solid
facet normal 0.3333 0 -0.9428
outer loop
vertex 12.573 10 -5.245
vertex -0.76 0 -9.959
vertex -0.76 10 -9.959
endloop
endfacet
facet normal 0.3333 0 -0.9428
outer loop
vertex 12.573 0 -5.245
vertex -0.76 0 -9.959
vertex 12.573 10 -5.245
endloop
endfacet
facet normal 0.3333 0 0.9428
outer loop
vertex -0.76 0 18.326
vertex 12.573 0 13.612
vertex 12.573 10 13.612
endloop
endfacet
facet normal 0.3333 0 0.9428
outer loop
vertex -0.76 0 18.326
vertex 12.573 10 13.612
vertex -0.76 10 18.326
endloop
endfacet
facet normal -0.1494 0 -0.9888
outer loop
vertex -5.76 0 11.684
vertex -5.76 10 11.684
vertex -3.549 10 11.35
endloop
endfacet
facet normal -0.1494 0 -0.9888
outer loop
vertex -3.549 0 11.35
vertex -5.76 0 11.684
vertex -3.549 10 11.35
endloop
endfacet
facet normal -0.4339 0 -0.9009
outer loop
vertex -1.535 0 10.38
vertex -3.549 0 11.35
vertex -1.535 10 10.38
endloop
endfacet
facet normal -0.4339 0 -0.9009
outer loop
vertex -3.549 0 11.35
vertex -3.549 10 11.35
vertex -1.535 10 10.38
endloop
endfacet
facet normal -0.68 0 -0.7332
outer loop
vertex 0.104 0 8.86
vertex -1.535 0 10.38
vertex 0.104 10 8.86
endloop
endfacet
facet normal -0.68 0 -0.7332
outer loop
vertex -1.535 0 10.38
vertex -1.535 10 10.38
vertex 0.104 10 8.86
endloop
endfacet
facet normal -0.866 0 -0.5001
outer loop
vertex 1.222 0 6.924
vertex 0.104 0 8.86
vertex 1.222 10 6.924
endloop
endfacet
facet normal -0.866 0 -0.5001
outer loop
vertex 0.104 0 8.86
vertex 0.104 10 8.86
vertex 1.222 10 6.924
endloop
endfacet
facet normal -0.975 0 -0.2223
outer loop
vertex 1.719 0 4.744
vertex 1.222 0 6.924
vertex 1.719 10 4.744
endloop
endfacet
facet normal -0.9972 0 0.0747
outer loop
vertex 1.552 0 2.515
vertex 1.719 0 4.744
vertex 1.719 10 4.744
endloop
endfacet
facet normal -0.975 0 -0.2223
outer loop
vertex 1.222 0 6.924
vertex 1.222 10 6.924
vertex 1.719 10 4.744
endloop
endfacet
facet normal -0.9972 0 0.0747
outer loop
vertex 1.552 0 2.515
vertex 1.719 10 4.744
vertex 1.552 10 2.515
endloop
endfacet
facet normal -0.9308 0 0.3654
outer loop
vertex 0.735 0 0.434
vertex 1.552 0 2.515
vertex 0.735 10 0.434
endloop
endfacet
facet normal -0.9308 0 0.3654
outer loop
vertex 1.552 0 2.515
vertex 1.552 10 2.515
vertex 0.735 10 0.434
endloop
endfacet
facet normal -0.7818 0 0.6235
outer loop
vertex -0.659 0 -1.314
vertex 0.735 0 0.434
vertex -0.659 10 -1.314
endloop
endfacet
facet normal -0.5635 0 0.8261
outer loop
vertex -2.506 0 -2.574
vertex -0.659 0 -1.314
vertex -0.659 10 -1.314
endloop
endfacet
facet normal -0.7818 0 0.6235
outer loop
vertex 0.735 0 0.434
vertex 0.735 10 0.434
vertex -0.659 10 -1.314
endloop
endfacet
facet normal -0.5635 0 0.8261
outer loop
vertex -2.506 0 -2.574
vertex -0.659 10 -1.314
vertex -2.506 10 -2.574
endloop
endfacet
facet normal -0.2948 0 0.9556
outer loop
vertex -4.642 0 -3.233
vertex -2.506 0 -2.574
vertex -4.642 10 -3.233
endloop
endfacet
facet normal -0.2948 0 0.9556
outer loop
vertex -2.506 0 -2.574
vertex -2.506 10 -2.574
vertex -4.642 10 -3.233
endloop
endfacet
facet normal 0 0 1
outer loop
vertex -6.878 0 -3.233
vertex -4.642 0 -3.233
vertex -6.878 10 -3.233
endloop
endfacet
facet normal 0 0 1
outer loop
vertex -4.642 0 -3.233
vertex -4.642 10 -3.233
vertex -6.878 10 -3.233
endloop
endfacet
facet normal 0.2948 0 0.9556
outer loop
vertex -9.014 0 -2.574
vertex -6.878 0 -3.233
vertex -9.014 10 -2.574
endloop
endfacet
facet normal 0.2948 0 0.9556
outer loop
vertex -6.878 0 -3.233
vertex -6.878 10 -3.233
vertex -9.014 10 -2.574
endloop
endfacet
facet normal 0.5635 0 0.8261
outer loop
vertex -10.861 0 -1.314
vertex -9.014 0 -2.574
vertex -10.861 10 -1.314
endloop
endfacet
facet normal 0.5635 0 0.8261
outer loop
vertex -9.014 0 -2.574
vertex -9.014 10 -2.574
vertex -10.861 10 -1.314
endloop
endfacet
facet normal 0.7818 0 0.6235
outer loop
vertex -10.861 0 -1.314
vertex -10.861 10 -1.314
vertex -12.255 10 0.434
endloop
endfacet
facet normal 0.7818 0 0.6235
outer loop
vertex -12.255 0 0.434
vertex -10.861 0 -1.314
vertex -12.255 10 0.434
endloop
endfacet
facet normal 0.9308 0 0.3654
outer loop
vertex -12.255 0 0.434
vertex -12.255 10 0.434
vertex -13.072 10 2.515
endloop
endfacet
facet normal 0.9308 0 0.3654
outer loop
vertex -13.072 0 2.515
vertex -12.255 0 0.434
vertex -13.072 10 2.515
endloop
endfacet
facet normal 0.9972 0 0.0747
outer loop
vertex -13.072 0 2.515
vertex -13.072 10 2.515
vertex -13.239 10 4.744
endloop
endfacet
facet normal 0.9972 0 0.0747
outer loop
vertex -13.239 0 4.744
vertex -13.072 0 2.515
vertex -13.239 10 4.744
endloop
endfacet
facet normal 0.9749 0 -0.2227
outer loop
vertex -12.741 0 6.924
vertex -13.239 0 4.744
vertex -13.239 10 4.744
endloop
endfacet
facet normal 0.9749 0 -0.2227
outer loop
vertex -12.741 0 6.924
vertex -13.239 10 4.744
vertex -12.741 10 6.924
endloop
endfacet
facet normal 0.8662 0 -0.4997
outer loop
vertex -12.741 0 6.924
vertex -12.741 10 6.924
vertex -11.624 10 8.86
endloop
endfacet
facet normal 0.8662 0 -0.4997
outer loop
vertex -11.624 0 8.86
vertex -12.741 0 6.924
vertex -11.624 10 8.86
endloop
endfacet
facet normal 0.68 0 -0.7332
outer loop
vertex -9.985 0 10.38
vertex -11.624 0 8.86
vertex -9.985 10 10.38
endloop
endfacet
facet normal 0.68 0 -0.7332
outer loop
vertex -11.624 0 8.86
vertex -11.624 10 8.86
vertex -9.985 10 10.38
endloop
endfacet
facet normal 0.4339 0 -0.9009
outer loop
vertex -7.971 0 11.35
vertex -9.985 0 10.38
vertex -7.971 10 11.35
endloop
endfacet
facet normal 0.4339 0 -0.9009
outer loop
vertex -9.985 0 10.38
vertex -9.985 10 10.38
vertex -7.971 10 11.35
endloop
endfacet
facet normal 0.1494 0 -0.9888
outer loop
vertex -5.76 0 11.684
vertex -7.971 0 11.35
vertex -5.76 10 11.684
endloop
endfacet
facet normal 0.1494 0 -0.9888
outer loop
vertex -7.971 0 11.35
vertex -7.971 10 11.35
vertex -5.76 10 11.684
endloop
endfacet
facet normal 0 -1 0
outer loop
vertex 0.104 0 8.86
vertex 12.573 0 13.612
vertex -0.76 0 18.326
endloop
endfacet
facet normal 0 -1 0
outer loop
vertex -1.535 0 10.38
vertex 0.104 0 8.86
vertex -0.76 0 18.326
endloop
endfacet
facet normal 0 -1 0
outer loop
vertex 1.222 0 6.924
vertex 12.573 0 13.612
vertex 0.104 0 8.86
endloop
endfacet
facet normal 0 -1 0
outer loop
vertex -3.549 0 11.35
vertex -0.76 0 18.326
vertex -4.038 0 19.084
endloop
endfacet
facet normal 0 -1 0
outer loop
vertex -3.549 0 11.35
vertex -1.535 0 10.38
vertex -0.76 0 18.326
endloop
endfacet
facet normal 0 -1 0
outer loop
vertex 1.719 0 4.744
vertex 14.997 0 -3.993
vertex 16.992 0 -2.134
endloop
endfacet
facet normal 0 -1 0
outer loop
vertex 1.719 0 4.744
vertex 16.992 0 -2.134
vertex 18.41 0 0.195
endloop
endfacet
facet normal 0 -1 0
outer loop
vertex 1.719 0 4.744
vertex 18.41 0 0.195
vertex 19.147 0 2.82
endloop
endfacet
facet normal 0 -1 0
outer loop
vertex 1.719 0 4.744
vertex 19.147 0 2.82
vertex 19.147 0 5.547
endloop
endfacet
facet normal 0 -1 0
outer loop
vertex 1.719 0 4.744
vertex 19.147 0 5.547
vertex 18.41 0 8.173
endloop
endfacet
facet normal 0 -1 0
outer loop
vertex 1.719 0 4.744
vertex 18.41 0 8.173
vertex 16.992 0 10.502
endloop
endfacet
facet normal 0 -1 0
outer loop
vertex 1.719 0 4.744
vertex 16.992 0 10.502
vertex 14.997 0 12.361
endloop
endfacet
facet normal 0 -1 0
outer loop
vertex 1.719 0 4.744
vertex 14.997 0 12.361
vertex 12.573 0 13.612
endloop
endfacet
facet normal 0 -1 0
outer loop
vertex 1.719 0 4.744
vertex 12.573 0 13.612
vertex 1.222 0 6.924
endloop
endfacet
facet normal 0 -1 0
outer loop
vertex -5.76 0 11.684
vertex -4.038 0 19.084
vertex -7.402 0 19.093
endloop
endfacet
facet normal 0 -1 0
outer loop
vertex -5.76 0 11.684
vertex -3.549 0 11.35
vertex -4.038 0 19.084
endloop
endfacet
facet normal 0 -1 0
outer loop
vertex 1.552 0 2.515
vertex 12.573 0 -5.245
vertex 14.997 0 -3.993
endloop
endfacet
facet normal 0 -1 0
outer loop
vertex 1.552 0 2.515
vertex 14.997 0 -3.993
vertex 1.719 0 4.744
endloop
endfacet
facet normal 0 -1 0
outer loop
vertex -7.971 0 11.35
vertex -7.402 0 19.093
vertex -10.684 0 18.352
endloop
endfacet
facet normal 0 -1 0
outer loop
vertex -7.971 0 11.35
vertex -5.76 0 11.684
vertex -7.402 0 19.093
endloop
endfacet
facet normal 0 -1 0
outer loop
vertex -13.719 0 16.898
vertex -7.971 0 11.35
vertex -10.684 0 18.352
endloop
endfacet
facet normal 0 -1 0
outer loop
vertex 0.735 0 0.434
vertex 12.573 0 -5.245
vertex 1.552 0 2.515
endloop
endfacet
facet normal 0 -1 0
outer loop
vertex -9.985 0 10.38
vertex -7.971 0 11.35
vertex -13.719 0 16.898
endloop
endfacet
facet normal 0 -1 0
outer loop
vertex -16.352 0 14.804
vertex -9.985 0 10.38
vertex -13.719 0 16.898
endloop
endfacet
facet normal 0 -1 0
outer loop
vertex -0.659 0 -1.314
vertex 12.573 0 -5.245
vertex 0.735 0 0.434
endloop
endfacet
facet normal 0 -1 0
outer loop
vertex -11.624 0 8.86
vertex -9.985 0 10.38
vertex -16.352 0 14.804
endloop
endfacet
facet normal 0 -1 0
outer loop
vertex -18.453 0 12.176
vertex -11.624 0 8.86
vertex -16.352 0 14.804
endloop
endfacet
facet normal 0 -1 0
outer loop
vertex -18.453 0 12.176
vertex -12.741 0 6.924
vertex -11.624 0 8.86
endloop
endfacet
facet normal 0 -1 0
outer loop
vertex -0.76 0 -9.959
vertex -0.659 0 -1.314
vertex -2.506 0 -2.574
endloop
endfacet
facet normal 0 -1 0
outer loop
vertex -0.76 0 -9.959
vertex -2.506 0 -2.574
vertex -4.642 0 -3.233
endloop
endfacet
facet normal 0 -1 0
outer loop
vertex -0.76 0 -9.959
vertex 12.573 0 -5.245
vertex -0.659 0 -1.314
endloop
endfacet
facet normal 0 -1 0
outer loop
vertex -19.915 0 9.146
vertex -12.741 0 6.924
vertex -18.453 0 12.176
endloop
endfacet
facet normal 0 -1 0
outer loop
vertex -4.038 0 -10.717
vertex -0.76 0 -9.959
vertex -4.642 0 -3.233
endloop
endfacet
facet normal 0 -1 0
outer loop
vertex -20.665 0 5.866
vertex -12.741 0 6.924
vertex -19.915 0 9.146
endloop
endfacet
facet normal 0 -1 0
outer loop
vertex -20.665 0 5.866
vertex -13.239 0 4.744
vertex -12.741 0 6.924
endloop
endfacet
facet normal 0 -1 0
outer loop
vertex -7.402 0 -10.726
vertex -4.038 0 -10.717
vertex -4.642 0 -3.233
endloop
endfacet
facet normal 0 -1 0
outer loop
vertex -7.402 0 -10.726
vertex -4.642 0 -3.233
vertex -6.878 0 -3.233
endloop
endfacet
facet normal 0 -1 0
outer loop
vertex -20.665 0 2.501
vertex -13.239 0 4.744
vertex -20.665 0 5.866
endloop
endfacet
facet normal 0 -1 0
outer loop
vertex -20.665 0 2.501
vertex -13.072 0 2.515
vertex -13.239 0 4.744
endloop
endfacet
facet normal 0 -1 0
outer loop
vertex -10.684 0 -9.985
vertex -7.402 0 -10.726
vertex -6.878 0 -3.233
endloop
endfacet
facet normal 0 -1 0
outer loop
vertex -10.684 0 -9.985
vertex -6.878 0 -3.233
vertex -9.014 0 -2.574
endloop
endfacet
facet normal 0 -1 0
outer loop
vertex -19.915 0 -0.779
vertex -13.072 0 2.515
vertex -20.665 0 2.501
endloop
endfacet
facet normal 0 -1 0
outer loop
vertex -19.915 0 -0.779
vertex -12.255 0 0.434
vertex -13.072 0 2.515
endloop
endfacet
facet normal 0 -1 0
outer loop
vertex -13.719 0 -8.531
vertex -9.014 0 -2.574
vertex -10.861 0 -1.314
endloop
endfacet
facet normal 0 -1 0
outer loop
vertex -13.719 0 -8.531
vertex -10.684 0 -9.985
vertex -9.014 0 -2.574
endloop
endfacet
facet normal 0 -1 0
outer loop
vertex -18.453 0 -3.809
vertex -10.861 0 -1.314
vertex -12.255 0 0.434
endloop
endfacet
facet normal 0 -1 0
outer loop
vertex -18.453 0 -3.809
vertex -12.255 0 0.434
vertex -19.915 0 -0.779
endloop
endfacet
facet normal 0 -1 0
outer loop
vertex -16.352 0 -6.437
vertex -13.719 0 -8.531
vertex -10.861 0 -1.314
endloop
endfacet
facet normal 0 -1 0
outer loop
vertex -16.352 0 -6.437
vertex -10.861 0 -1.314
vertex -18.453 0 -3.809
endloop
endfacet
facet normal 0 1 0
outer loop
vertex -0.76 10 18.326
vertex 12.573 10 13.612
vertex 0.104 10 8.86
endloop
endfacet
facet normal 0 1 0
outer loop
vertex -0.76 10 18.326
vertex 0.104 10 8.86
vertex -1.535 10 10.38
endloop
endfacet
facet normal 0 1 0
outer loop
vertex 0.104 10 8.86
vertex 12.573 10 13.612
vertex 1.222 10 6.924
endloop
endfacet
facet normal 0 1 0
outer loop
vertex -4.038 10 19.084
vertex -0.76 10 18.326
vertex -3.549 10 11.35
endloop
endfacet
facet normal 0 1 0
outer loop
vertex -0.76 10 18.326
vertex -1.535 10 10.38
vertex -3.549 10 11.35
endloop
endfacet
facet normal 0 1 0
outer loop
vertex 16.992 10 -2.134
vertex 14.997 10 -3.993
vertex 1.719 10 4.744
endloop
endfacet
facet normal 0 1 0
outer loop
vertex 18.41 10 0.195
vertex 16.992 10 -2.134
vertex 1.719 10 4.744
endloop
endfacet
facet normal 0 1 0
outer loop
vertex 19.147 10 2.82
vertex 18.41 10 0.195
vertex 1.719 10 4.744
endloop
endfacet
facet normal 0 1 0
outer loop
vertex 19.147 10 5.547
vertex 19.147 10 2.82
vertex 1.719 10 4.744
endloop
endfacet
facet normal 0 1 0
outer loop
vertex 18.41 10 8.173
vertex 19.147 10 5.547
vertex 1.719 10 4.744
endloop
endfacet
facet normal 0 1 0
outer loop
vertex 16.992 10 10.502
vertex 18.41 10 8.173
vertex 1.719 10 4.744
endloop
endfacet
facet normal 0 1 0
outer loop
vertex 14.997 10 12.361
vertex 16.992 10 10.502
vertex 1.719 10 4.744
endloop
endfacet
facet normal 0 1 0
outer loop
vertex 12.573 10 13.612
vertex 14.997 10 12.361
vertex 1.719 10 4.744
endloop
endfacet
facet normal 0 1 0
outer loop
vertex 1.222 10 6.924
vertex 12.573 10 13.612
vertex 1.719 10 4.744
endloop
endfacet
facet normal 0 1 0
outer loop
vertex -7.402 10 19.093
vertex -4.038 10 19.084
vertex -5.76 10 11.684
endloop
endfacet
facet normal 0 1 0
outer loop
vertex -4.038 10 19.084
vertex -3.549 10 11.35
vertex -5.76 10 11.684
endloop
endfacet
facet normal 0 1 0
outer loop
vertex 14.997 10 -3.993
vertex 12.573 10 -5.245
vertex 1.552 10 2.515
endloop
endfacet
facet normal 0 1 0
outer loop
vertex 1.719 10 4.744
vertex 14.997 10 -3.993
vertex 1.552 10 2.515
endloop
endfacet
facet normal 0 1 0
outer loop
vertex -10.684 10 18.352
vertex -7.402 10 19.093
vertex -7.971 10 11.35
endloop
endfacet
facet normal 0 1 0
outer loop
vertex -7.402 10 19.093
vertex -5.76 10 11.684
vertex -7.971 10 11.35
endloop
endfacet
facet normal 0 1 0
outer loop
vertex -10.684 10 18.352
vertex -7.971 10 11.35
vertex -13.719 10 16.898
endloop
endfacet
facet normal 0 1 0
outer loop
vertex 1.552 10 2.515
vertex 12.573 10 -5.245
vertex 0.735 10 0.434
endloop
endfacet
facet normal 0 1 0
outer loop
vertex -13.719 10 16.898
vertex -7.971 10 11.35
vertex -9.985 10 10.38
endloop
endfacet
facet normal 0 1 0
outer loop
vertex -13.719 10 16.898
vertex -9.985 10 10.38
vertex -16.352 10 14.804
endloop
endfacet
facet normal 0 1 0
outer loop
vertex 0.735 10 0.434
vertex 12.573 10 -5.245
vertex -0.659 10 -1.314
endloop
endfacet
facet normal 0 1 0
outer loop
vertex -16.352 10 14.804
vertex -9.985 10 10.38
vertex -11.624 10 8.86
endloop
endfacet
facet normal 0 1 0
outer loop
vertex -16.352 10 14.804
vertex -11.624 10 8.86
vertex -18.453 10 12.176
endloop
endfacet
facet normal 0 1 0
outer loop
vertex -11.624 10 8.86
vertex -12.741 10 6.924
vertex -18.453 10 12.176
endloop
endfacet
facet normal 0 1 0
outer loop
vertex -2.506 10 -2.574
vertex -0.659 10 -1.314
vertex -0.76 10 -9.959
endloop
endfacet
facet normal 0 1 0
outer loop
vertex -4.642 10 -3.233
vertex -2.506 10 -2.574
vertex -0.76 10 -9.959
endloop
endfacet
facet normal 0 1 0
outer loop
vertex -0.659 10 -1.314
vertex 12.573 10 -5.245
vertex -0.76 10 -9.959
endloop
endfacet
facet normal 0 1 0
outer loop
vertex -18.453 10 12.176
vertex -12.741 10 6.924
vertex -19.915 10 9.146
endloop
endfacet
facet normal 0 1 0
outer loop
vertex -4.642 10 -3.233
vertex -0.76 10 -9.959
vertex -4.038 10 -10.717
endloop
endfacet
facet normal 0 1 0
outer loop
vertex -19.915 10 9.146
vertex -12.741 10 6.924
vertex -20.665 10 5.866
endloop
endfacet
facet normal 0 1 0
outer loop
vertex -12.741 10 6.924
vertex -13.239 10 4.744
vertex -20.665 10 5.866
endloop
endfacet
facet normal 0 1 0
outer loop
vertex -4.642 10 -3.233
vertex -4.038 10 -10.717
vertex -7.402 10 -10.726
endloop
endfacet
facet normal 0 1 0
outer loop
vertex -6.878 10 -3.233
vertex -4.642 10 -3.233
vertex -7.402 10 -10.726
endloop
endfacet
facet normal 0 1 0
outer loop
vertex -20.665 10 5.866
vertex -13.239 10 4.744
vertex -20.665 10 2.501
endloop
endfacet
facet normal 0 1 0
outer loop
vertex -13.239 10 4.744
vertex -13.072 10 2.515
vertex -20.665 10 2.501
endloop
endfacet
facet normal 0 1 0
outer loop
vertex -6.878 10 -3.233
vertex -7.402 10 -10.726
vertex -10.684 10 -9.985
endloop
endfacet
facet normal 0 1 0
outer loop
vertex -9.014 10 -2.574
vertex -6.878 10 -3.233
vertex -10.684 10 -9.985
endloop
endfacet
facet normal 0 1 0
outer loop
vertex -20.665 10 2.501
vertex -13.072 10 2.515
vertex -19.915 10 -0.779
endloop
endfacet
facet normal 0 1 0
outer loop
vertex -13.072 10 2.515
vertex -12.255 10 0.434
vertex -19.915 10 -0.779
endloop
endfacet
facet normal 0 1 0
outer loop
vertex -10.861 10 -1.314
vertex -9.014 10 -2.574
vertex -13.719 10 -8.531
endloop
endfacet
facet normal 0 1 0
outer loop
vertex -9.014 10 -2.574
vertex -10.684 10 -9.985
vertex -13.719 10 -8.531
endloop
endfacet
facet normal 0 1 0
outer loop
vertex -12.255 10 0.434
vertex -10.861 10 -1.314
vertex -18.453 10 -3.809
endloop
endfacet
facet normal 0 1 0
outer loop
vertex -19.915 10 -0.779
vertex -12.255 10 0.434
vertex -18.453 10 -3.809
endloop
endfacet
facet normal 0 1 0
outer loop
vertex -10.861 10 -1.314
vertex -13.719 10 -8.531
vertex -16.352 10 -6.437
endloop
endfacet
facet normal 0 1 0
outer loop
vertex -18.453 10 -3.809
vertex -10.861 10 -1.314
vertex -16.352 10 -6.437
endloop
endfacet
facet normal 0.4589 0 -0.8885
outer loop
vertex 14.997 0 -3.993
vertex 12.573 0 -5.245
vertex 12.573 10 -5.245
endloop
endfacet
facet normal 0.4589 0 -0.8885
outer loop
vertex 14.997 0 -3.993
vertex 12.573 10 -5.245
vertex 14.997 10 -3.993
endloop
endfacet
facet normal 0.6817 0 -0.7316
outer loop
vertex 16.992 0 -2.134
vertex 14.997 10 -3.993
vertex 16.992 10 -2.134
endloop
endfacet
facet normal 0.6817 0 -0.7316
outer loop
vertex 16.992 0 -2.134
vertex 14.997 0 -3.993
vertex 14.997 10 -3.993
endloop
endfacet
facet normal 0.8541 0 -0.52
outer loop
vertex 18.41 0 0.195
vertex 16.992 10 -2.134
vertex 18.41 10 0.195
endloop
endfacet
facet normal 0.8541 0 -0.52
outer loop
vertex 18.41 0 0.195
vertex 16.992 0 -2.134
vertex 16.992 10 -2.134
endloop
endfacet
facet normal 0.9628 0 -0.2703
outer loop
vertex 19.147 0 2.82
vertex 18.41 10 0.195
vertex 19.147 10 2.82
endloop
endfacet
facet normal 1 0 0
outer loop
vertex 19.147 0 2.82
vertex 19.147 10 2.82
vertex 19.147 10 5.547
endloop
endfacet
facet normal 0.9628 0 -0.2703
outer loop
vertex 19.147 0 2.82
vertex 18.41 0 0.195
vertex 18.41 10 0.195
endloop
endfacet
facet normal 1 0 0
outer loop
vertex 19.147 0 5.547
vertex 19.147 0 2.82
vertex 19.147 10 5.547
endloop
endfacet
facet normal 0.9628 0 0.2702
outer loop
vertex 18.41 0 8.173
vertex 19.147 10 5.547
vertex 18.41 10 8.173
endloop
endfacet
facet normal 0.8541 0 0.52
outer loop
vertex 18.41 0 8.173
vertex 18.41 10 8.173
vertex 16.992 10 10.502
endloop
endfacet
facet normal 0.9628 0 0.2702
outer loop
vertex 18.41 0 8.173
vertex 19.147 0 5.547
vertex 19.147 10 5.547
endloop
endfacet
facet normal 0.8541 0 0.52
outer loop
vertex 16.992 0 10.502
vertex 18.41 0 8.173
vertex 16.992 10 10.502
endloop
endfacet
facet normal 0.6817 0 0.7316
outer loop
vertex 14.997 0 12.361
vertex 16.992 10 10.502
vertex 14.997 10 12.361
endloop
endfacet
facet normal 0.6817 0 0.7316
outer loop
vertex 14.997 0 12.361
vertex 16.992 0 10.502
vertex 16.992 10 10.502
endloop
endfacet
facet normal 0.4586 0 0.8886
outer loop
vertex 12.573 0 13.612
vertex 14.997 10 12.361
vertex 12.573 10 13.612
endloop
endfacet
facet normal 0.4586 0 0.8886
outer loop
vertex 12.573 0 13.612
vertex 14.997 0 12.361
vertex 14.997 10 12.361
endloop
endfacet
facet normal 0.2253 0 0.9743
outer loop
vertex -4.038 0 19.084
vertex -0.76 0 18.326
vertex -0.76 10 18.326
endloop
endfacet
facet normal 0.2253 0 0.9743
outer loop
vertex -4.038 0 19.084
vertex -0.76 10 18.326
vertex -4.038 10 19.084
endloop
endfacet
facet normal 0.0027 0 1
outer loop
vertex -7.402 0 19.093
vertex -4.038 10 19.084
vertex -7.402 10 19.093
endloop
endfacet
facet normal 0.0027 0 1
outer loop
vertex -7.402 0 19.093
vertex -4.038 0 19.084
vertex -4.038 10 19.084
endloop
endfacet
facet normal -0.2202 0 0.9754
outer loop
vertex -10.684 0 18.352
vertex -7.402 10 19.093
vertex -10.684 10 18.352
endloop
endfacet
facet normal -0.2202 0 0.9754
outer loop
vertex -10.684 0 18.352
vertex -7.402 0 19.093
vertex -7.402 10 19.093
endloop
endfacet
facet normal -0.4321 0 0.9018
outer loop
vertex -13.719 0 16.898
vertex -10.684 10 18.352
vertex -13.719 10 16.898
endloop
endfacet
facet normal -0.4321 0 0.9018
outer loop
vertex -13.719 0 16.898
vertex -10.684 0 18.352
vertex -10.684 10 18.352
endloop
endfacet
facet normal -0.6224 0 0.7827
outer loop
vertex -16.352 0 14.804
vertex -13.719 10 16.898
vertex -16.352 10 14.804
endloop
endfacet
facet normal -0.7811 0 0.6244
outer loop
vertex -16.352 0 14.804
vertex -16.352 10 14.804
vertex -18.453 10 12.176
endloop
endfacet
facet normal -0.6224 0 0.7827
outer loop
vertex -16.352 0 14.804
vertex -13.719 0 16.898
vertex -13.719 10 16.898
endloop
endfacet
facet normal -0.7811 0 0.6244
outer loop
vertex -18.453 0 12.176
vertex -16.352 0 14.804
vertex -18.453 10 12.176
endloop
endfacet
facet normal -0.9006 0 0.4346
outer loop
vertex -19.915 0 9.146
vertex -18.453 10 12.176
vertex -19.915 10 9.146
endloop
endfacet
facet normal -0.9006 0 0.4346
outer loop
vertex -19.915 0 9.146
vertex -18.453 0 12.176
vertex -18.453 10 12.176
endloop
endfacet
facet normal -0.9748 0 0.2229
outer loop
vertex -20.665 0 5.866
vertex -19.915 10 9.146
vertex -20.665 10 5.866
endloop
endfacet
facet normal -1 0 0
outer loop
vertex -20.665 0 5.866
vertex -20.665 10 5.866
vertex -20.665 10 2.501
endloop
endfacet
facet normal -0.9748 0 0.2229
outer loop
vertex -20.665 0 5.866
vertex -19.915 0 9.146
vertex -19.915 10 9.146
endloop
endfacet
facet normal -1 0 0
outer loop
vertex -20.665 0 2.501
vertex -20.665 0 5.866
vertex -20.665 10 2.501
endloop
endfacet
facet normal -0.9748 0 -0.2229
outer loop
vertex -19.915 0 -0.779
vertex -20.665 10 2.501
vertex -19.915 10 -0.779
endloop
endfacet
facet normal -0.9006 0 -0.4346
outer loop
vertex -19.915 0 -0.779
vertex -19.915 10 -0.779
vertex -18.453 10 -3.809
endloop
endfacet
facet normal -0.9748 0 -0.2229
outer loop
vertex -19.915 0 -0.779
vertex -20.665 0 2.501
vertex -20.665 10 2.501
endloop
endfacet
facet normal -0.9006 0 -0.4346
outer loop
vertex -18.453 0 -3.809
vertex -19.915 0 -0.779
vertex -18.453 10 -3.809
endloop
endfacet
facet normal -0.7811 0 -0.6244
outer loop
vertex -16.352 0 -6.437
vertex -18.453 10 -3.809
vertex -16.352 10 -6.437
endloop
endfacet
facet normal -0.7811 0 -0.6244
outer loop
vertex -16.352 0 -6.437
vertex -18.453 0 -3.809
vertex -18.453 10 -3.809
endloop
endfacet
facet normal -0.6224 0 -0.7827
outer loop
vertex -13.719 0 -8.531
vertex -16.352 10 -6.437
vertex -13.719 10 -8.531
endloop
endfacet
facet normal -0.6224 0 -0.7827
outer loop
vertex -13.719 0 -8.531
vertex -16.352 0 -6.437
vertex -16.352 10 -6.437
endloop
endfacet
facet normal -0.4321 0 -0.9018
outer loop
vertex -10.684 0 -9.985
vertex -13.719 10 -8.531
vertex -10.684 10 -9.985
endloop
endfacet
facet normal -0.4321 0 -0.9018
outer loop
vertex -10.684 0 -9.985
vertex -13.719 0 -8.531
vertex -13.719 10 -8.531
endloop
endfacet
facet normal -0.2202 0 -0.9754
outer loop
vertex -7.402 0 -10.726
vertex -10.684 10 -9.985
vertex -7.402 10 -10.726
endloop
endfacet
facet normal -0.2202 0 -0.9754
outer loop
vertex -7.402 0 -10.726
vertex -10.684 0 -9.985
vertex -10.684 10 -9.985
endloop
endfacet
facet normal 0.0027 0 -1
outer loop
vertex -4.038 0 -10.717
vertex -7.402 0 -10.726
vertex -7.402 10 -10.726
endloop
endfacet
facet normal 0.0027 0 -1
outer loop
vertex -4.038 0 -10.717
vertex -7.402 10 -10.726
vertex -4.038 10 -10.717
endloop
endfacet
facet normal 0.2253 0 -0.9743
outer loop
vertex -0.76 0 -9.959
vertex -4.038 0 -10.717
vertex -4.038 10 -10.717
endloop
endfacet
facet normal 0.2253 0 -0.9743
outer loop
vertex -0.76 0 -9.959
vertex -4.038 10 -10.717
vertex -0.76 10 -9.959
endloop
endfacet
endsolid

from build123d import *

# Parameters (mm, degrees)
EXTRUDE_1_DEPTH     = 10
SKETCH_2_R          = 7.5
CUT_EXTRUDE_1_DEPTH = 10


with BuildPart() as part:
    # 草图1 → 凸台-拉伸1 (new body)
    with BuildSketch(Plane(origin=(0, 0, 0), x_dir=(1, 0, 0), z_dir=(0, 1, 0))):
        with BuildLine():
            Line((-0.759854477, 9.958566069), (12.573478857, 5.244520861))
            ThreePointArc((12.573478857, 5.244520861), (19.240145523, -4.183569555), (12.573478857, -13.611659971))
            Line((12.573478857, -13.611659971), (-0.759854477, -18.325705179))
            ThreePointArc((-0.759854477, -18.325705179), (-20.759854477, -4.183569555), (-0.759854477, 9.958566069))
        make_face()
    extrude(amount=EXTRUDE_1_DEPTH)

    # 草图2 → 切除-拉伸1 (cut)
    with BuildSketch(Plane(origin=(0, 10, 0), x_dir=(1, 0, 0), z_dir=(0, 1, 0))):
        with Locations(Location((-5.759854477, -4.183569555, 0), (0, 0, 270))):
            Circle(SKETCH_2_R)
    extrude(amount=-CUT_EXTRUDE_1_DEPTH, mode=Mode.SUBTRACT)


solid = part.part
